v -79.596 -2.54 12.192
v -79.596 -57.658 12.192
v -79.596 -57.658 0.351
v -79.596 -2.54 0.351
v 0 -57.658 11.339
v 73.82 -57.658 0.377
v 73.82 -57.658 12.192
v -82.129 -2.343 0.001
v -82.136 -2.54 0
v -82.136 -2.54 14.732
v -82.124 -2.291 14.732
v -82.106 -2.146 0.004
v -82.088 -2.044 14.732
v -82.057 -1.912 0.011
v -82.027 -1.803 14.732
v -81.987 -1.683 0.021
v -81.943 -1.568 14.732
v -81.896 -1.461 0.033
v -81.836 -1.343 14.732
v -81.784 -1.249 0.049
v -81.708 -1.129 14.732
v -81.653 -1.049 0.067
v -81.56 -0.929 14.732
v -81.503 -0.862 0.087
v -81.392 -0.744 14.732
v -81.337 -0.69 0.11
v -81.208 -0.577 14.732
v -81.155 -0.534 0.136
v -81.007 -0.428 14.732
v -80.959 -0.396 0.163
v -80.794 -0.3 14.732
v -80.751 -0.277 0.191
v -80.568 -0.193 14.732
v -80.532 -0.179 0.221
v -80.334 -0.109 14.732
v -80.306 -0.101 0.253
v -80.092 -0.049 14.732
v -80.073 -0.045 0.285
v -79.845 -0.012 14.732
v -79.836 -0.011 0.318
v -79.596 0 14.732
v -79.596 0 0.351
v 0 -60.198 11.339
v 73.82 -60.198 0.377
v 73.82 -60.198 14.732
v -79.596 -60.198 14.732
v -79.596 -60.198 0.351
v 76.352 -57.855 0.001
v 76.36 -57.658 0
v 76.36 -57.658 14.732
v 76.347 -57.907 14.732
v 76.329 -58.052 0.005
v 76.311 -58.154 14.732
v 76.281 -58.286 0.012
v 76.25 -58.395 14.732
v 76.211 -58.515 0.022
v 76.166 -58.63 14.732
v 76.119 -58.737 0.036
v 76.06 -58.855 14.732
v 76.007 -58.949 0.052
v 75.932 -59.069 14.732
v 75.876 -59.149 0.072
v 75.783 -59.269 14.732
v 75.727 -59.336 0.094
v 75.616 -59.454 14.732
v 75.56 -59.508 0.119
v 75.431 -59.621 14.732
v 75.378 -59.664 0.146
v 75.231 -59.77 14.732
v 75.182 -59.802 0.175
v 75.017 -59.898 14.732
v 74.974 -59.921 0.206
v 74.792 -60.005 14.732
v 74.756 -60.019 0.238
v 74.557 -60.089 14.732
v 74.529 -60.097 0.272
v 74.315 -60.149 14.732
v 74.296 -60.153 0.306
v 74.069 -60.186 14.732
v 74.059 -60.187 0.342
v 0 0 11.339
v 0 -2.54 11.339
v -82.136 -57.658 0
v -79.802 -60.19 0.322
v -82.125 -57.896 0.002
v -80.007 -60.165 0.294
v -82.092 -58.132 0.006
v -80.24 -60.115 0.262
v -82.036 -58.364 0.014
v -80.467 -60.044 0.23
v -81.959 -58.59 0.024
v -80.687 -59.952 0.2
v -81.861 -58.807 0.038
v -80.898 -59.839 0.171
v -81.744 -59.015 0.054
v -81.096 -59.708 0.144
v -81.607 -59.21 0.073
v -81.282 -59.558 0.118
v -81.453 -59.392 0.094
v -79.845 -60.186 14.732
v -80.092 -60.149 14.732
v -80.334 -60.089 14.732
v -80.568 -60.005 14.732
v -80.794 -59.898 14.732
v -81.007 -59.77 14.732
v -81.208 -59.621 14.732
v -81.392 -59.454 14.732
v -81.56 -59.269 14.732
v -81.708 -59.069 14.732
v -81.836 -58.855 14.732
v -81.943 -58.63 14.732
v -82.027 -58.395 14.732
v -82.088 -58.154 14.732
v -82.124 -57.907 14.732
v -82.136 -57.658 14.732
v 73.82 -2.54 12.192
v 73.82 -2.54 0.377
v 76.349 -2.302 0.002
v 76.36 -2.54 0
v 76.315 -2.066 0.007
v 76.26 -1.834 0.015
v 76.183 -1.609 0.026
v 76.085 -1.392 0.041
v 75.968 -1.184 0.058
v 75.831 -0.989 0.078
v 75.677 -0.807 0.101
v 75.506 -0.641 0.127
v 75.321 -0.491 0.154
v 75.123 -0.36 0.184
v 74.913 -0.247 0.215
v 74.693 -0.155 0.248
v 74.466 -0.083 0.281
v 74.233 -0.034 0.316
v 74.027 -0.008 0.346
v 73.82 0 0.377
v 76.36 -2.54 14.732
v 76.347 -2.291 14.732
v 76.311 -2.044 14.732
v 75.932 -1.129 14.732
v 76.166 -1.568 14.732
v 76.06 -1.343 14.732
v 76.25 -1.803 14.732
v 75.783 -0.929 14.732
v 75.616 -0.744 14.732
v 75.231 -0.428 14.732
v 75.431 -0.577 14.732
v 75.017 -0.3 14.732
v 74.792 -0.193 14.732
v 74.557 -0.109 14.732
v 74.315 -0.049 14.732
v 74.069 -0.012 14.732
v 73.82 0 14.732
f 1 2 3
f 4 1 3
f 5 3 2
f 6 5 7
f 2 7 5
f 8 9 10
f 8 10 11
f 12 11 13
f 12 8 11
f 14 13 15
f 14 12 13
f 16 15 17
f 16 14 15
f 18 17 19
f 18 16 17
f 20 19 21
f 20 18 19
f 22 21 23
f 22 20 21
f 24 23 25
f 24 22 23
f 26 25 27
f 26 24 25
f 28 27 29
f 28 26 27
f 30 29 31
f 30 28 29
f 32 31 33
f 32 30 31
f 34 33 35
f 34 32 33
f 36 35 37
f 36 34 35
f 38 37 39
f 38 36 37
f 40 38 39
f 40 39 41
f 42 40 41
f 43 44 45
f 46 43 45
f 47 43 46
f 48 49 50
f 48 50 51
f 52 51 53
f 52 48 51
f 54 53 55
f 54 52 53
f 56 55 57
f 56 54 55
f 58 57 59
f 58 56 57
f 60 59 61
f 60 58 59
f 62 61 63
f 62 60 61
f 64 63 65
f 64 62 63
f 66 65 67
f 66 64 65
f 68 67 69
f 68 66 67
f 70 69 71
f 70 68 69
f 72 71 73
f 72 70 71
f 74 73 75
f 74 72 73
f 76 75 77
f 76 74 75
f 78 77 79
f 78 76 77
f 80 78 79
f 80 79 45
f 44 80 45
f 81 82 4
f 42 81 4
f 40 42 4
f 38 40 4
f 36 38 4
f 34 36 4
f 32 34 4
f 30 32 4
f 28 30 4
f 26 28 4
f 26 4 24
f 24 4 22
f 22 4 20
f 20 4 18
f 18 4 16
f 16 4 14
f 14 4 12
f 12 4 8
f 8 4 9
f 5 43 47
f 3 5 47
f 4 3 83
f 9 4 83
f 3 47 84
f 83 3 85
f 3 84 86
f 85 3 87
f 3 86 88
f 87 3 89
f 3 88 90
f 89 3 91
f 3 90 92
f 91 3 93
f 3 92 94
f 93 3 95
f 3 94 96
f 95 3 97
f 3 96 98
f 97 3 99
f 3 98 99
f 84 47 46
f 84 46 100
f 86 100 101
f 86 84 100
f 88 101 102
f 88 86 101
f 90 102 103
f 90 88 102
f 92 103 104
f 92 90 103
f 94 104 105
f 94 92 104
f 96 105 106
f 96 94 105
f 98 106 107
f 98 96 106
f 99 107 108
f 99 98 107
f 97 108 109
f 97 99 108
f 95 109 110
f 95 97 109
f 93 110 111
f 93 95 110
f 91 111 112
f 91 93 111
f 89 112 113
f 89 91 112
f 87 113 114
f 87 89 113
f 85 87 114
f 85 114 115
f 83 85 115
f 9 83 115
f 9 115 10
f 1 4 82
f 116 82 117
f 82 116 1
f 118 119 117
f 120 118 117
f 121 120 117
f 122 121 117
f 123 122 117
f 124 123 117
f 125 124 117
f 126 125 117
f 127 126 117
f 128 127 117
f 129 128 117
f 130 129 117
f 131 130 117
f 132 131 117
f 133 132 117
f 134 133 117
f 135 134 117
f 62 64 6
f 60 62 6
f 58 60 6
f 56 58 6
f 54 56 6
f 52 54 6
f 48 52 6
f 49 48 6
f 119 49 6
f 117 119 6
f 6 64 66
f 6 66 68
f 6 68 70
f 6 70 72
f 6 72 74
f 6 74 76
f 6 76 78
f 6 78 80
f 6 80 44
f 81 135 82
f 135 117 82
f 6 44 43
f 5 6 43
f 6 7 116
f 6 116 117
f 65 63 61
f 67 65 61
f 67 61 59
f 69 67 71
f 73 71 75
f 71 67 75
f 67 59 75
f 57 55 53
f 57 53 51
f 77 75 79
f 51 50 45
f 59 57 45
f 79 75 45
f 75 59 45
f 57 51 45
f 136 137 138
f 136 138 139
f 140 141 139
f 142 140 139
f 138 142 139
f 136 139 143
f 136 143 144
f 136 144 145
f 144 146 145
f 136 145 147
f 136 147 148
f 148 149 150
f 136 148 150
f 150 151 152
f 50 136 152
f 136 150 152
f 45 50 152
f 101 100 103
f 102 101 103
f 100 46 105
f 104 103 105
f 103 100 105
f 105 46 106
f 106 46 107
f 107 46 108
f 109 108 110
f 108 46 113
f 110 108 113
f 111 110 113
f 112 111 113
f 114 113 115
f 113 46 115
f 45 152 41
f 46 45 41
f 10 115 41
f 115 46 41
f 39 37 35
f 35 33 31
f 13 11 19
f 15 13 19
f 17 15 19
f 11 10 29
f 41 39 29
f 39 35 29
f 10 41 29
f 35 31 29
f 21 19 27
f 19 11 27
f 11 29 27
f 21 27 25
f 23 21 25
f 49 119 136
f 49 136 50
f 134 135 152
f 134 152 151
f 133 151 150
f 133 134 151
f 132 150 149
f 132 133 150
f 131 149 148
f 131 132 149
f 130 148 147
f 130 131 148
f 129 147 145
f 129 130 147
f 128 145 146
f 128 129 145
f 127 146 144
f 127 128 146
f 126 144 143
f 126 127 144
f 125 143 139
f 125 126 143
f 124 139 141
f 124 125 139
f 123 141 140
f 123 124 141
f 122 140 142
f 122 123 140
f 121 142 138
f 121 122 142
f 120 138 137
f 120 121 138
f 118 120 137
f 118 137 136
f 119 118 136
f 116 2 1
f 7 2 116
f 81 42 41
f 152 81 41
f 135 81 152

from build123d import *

# Parameters (mm, degrees)
BOSS_EXTRUDE1_DEPTH     = 14.732
SHELL1_START            = -57.658
SHELL1_OUTLINE_W        = 153.416
SHELL1_OUTLINE_H        = 12.192
SHELL1_DEPTH            = 55.118
CUT_EXTRUDE1_DEPTH      = 103.89414179
CUT_EXTRUDE1_DEPTH_BACK = 103.89414179


# Read off the part's stored shape, not the designer's step: Shell1
with BuildPart() as part:
    # Sketch1 → Boss-Extrude1 (new body)
    with BuildSketch(Plane.XY):
        with BuildLine():
            Line((-79.596309795, 0), (73.819690205, 0))
            ThreePointArc((73.819690205, 0), (75.615741429, -0.743948776), (76.359690205, -2.54))
            Line((76.359690205, -2.54), (76.359690205, -57.658))
            ThreePointArc((76.359690205, -57.658), (75.615741429, -59.454051224), (73.819690205, -60.198))
            Line((73.819690205, -60.198), (-79.596309795, -60.198))
            ThreePointArc((-79.596309795, -60.198), (-81.392361019, -59.454051224), (-82.136309795, -57.658))
            Line((-82.136309795, -57.658), (-82.136309795, -2.54))
            ThreePointArc((-82.136309795, -2.54), (-81.392361019, -0.743948776), (-79.596309795, 0))
        make_face()
    extrude(amount=BOSS_EXTRUDE1_DEPTH)

    # Shell1 outline → Shell1 (cut)
    with BuildSketch(Plane(origin=(0, 0, 0), x_dir=(1, 0, 0), z_dir=(0, 1, 0)).offset(SHELL1_START)):
        with Locations((-2.888309795, -6.096)):
            Rectangle(SHELL1_OUTLINE_W, SHELL1_OUTLINE_H)
    extrude(amount=SHELL1_DEPTH, mode=Mode.SUBTRACT)

    # Sketch3 → Cut-Extrude1 (cut, two sides: drawn at the far end of the back side and taken through both)
    with BuildSketch(Plane(origin=(0, 0, 0), x_dir=(1, 0, 0), z_dir=(0, 1, 0)).offset(-CUT_EXTRUDE1_DEPTH_BACK)):
        Polygon((76.359690205, 0), (0, -11.339454315), (-82.136309795, 0), align=None)
    extrude(amount=CUT_EXTRUDE1_DEPTH + CUT_EXTRUDE1_DEPTH_BACK, mode=Mode.SUBTRACT)


solid = part.part
